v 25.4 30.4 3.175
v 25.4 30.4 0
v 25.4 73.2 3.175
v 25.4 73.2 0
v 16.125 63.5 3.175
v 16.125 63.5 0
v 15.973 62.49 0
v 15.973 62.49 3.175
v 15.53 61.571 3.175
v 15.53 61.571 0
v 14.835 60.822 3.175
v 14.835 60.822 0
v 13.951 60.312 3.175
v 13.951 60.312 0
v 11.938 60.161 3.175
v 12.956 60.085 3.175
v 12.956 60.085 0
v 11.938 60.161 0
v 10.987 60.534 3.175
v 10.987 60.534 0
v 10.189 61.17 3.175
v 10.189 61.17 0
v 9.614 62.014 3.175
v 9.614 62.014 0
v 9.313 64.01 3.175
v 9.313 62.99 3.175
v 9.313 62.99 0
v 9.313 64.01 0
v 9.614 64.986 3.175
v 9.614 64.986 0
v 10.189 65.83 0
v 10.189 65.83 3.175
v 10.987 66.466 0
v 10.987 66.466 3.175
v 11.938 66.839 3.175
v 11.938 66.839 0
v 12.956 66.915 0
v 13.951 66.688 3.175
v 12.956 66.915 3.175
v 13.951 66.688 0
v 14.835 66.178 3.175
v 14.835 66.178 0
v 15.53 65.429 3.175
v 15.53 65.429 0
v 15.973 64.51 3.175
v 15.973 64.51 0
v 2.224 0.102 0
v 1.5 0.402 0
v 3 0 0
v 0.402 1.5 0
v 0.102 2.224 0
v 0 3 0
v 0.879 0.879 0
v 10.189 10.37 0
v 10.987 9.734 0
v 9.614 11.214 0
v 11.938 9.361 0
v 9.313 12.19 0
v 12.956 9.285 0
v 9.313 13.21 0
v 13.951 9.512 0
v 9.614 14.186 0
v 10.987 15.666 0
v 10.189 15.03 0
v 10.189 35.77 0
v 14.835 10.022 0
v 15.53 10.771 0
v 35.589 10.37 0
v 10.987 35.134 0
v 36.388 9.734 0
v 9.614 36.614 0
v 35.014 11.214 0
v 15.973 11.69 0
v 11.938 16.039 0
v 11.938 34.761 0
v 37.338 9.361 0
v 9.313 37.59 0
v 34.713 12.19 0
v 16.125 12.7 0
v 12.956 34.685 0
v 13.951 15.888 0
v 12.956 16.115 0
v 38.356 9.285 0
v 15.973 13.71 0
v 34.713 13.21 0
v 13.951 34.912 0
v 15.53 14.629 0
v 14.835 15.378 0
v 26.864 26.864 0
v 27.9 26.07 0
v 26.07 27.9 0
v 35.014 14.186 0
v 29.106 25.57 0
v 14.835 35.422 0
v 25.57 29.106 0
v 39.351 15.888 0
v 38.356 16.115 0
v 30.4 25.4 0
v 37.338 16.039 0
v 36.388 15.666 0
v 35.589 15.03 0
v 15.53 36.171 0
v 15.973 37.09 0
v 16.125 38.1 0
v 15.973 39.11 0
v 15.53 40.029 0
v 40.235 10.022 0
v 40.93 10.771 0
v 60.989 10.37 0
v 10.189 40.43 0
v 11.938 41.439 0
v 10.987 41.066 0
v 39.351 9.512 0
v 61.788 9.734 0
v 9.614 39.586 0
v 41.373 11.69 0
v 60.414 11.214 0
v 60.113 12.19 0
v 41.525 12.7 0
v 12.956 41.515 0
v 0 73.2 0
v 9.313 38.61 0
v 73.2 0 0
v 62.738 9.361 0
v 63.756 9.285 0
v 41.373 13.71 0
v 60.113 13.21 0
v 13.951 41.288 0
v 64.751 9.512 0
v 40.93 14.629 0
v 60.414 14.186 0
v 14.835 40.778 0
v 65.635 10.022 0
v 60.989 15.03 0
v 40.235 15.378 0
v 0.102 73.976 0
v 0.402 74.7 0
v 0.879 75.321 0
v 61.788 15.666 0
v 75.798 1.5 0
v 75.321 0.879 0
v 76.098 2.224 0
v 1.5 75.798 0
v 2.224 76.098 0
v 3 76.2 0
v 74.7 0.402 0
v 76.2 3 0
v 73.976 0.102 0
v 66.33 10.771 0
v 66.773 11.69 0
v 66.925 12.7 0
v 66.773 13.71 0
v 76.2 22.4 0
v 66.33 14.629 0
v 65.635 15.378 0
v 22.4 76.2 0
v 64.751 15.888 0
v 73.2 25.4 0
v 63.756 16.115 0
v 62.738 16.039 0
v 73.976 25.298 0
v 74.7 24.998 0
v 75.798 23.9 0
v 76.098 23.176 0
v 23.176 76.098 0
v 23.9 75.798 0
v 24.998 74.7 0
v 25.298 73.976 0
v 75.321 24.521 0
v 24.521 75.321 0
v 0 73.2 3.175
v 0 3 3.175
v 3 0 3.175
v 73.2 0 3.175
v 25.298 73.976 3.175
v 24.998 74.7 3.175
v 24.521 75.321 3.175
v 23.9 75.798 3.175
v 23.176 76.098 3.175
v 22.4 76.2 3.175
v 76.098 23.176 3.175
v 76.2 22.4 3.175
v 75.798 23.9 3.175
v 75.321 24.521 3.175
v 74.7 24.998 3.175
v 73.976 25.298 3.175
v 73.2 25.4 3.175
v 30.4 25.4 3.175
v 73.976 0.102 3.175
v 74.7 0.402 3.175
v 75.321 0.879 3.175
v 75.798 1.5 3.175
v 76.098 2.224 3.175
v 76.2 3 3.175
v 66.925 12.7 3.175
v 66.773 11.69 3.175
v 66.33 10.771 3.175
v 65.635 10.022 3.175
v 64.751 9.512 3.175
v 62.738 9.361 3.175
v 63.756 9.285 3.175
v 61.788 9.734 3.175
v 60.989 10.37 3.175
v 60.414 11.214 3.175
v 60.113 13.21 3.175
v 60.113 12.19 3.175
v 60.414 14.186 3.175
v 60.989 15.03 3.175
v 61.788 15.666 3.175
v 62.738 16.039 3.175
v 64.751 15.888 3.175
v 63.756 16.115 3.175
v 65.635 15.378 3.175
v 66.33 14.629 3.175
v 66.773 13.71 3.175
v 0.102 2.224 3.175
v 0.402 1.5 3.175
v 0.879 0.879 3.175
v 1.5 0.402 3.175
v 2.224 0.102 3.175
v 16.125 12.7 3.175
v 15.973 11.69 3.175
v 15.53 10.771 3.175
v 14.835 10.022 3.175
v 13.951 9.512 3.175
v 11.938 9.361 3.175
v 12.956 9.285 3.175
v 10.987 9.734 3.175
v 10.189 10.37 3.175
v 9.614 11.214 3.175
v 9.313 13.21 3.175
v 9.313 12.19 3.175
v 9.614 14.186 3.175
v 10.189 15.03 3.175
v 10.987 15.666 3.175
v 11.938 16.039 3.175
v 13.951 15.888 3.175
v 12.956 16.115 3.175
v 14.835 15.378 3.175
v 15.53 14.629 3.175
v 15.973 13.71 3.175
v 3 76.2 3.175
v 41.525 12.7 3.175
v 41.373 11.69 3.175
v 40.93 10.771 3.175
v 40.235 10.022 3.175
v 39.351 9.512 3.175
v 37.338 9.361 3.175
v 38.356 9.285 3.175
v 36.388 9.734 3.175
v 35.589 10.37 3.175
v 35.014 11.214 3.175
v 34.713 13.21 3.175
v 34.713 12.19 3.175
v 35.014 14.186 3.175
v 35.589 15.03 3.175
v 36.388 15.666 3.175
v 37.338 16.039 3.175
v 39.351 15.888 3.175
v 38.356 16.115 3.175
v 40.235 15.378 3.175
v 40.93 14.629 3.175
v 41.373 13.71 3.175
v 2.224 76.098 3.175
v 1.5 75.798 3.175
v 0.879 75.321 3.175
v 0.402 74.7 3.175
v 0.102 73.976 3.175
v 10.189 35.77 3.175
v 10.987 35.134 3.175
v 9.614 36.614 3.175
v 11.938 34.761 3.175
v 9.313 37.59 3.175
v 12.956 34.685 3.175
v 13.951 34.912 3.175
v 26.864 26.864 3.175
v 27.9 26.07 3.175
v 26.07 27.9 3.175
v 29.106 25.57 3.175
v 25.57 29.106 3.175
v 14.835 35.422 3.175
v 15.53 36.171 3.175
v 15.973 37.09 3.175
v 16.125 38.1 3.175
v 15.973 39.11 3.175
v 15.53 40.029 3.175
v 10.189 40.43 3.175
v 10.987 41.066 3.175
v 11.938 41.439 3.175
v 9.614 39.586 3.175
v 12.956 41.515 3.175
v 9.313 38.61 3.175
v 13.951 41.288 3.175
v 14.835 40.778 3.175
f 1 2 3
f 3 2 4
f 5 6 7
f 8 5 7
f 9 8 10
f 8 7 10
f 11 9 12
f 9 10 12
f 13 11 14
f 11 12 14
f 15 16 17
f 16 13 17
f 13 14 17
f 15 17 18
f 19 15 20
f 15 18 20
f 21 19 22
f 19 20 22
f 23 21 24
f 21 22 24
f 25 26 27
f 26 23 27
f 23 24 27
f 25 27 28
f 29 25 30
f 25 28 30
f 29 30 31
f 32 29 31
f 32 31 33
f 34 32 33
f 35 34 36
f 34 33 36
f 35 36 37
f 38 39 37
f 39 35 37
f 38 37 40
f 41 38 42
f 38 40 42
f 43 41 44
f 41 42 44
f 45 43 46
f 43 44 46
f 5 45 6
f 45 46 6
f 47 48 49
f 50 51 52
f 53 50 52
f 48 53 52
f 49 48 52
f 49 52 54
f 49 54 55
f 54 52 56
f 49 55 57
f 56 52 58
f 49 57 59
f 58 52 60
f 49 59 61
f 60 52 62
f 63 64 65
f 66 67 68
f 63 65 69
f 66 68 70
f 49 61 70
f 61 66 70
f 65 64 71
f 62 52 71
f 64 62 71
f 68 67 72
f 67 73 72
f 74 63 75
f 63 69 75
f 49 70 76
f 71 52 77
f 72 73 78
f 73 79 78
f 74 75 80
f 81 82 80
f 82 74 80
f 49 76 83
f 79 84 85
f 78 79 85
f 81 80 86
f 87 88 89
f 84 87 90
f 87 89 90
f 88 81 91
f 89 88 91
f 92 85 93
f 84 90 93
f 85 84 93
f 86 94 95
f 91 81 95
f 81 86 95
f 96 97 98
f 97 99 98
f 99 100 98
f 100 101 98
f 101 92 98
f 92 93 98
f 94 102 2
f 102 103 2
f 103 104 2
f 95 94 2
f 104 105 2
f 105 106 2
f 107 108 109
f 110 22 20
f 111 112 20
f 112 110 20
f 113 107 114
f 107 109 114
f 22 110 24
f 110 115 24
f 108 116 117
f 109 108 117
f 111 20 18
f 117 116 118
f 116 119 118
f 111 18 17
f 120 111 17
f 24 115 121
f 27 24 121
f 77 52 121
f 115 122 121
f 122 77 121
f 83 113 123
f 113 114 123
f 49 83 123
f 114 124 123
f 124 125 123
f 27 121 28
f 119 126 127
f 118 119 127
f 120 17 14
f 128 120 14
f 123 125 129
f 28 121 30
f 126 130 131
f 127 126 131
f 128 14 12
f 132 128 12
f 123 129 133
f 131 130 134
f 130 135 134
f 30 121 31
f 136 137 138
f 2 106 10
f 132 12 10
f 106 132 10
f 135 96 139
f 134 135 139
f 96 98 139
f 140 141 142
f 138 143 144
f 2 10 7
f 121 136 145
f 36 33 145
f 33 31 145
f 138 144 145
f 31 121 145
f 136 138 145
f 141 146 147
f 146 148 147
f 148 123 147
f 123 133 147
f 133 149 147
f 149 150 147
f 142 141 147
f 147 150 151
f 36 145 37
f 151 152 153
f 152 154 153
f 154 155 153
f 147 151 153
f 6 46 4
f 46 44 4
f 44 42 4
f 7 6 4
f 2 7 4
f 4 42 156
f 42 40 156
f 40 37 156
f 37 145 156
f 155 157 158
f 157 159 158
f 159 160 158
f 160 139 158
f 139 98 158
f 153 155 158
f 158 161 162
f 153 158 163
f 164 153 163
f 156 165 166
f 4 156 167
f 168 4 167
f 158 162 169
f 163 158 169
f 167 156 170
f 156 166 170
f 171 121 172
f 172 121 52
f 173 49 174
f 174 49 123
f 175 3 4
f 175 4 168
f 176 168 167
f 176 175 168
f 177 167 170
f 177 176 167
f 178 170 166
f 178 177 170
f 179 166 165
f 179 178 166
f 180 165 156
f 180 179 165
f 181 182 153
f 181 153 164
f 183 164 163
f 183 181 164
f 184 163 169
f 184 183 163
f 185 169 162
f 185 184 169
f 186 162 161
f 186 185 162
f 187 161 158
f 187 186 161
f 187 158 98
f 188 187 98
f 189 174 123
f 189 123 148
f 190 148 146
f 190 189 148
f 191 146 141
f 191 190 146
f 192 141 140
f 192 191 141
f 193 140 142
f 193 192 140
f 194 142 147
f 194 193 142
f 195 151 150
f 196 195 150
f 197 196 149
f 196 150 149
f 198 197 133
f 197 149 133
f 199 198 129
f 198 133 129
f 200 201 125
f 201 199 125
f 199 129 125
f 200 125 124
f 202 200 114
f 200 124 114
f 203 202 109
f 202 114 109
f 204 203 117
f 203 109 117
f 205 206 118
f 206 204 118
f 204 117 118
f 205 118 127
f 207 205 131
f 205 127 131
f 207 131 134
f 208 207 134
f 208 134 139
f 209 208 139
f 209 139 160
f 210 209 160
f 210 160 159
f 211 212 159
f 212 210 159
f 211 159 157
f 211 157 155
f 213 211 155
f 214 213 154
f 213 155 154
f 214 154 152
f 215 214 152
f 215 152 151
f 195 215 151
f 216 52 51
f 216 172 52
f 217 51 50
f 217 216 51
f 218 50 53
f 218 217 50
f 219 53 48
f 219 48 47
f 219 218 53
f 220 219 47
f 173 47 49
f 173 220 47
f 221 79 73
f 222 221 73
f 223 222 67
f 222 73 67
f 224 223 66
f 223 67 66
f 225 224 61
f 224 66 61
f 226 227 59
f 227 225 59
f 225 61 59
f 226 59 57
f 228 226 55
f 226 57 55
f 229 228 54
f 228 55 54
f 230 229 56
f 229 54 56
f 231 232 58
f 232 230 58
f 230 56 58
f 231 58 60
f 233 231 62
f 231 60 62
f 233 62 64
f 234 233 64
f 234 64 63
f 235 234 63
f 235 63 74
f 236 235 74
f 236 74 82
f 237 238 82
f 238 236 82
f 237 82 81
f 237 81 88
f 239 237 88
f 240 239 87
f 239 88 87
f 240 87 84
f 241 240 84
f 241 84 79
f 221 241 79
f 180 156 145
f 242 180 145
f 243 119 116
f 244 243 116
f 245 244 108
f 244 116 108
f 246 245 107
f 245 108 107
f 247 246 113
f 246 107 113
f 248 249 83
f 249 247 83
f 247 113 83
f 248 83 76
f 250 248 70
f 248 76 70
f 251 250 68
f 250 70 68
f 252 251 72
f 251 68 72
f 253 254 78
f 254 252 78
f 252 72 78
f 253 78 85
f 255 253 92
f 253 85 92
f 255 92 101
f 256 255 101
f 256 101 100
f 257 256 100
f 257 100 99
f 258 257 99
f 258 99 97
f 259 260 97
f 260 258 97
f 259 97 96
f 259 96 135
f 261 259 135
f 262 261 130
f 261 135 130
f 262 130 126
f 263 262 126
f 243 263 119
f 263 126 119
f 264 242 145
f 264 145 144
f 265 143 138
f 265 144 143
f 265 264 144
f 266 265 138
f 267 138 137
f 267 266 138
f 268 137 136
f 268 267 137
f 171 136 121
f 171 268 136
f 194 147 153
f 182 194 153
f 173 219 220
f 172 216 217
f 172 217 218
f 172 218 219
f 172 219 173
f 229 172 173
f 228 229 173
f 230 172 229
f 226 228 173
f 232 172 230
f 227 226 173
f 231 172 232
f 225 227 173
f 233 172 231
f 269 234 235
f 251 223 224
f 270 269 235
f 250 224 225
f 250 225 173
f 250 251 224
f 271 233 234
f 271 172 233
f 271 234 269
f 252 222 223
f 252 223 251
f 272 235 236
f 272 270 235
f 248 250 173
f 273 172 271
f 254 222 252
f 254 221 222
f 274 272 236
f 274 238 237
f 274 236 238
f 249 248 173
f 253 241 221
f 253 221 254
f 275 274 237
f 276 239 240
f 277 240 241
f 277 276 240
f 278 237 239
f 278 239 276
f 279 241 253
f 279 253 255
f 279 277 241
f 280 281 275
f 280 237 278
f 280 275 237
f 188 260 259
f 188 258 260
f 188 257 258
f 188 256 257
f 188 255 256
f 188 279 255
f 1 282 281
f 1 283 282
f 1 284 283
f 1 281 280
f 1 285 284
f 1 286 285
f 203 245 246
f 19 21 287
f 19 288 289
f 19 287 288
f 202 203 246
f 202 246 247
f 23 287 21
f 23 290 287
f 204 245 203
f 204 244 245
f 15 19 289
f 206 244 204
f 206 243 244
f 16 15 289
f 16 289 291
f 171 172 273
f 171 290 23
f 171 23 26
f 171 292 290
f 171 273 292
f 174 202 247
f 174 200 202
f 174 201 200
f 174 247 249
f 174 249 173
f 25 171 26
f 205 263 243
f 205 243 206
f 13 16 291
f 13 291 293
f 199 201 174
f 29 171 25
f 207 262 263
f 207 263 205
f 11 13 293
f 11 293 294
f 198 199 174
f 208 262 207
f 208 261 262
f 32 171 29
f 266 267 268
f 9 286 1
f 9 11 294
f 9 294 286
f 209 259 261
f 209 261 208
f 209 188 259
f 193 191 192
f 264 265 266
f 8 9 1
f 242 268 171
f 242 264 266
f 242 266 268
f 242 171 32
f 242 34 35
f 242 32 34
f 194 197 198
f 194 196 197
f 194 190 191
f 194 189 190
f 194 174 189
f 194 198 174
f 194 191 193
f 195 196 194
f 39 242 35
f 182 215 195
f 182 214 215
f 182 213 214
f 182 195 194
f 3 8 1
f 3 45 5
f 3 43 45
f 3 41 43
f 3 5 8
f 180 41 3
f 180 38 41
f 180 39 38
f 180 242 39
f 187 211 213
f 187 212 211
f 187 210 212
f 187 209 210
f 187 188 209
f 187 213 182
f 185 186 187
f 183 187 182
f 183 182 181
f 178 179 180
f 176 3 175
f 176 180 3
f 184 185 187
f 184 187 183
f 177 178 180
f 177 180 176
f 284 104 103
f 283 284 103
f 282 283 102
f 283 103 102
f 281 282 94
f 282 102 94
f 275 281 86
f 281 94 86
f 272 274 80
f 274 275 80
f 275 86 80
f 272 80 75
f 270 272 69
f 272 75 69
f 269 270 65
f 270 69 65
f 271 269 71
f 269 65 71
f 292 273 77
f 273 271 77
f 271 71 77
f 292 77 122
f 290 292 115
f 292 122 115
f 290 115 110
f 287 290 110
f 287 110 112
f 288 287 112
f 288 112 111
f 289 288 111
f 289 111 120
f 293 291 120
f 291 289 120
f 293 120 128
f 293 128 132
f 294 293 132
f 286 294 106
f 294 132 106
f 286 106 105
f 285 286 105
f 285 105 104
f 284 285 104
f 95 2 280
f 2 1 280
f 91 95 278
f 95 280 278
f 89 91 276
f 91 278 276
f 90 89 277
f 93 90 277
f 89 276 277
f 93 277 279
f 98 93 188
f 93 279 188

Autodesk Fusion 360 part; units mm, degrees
sketch "Sketch1" plane through (0, 0, 0) normal (0, 0, 1) x (1, 0, 0)
  line L0 (0, 0) -> (76.2, 0)
  line L1 (76.2, 0) -> (76.2, 25.4)
  line L2 (76.2, 25.4) -> (25.4, 25.4)
  line L3 (25.4, 25.4) -> (25.4, 76.2)
  line L4 (25.4, 76.2) -> (0, 76.2)
  line L5 (0, 76.2) -> (0, 0)
  line L6 (0, 0) -> (25.4, 25.4) construction
  circle A0 centre (12.7, 12.7) radius 3.425
  circle A1 centre (38.1, 12.7) radius 3.425
  circle A2 centre (63.5, 12.7) radius 3.425
  circle A3 centre (12.7, 38.1) radius 3.425
  circle A4 centre (12.7, 63.5) radius 3.425
  dimension "d1" = 25.4
  dimension "d2" = 25.4
  dimension "d3" = 6.85
  dimension "d4" = 12.7
  dimension "d5" = 25.4
  dimension "d6" = 12.7
  dimension "d7" = 12.7
  dimension "d8" = 12.7
  dimension "d9" = 25.4
extrude "Extrude1" add sketch "Sketch1" along normal blind 3.175
fillet "Fillet1" radius 3 5 edges at (0, 0, 1.5875) (76.2, 0, 1.5875) (76.2, 25.4, 1.5875) (25.4, 76.2, 1.5875) (0, 76.2, 1.5875)
fillet "Fillet1" radius 5 1 edges at (25.4, 25.4, 1.5875)
sketch "DXF" plane through (0, 0, 3.175) normal (0, 0, 1) x (-1, 0, 0)
  arc A0 (-3, -76.2) -> (0, -73.2) centre (-3, -73.2) ccw
  line L0 (0, -73.2) -> (0, -3)
  arc A1 (0, -3) -> (-3, 0) centre (-3, -3) ccw
  line L1 (-3, 0) -> (-73.2, 0)
  arc A2 (-73.2, 0) -> (-76.2, -3) centre (-73.2, -3) ccw
  line L2 (-76.2, -3) -> (-76.2, -22.4)
  arc A3 (-76.2, -22.4) -> (-73.2, -25.4) centre (-73.2, -22.4) ccw
  line L3 (-73.2, -25.4) -> (-30.4, -25.4)
  arc A4 (-25.4, -30.4) -> (-30.4, -25.4) centre (-30.4, -30.4) ccw
  line L4 (-25.4, -30.4) -> (-25.4, -73.2)
  arc A5 (-25.4, -73.2) -> (-22.4, -76.2) centre (-22.4, -73.2) ccw
  line L5 (-22.4, -76.2) -> (-3, -76.2)
  circle A6 centre (-63.5, -12.7) radius 3.425
  circle A7 centre (-12.7, -12.7) radius 3.425
  circle A8 centre (-38.1, -12.7) radius 3.425
  circle A9 centre (-12.7, -63.5) radius 3.425
  circle A10 centre (-12.7, -38.1) radius 3.425
equation "d3 = 0.25 in + 0.5 mm"
equation "d6 = d4"
equation "d7 = d4"
equation "d8 = d7"
equation "d9 = d5"
equation "d10 = ( 1 / 8 ) * 1 in"
